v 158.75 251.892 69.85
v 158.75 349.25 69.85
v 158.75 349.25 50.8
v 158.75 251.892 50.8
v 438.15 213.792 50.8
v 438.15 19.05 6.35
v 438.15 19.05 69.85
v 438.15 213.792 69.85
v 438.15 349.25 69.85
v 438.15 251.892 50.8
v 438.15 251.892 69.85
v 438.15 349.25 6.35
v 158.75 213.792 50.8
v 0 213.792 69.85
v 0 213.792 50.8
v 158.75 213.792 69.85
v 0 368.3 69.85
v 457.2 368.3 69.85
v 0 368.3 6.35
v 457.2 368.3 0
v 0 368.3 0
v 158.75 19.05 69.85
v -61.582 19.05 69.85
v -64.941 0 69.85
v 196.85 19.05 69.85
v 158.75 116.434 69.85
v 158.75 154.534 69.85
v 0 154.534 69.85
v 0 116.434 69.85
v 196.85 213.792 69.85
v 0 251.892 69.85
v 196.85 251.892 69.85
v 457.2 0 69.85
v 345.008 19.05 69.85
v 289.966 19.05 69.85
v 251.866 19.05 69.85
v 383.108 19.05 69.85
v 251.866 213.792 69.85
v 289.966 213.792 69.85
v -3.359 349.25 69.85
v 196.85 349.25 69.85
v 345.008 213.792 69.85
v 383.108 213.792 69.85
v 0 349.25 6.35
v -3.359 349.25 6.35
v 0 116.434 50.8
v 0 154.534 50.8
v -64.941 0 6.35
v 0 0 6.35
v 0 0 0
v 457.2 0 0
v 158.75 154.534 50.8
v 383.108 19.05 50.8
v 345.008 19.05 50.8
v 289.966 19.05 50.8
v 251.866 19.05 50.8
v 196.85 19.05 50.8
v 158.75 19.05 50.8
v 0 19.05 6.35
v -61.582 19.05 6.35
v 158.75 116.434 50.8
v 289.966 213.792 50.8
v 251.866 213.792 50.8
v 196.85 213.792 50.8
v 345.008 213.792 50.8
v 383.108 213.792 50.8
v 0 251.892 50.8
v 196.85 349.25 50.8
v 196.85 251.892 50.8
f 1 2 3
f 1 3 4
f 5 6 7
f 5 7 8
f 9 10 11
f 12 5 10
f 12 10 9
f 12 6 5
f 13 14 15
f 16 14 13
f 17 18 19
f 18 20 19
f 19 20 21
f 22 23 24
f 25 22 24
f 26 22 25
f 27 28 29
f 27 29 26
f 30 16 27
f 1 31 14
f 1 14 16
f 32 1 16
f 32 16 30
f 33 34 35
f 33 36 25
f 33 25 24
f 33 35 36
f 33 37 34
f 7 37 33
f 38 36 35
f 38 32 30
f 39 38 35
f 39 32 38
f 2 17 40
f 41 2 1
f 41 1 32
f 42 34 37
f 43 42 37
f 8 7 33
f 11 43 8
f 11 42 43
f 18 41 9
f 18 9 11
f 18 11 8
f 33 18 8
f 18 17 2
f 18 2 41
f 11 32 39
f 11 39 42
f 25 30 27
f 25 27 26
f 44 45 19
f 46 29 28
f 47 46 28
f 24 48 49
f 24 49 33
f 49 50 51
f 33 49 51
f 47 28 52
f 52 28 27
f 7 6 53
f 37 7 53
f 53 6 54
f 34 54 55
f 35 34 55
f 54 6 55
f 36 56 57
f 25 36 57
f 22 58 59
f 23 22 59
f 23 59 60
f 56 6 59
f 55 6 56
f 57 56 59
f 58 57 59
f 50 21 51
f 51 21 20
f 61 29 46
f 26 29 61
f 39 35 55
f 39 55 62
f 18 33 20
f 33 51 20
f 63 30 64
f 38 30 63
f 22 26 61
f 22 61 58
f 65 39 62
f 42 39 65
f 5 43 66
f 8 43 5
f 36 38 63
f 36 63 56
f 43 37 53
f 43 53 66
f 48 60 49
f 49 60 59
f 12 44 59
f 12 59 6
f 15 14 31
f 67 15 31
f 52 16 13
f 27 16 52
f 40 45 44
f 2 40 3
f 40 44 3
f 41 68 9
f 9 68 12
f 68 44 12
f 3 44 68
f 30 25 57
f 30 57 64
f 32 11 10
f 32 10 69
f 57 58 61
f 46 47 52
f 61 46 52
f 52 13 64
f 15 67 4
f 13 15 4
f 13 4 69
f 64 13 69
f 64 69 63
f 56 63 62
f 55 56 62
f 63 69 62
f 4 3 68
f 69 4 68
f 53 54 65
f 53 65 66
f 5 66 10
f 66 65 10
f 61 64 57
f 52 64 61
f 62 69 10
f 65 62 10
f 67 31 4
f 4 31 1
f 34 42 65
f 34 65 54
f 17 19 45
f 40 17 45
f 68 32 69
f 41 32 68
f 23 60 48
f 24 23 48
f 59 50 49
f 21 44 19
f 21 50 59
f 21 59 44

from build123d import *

# Parameters (mm, degrees)
F0_W     = 457.2
F0_H     = 368.3
F1_DEPTH = 6.35
F2_W     = 19.05
F2_H     = 330.2
F3_DEPTH = 63.5
F4_W     = 158.75
F4_H     = 38.1
F4_W_2   = 55.0164
F4_W_3   = 55.0418
F5_DEPTH = 19.05


with BuildPart() as f1:
    # F0 (on Top) → F1 (new body)
    with BuildSketch(Plane.XY):
        with Locations((228.6, 184.15)):
            Rectangle(F0_W, F0_H)
    extrude(amount=F1_DEPTH)

    # F2 (on face) → F3 (join)
    with BuildSketch(Plane.XY.offset(6.35)):
        Polygon((-61.582198, 19.05), (-64.941227, 0), (0, 0), (0, 19.05), align=None)
        Polygon((0, 19.05), (0, 0), (457.2, 0), (457.2, 19.05), (438.15, 19.05), align=None)
        with Locations((447.675, 184.15)):
            Rectangle(F2_W, F2_H)
        Polygon((0, 368.3), (0, 349.25), (438.15, 349.25), (457.2, 349.25), (457.2, 368.3), align=None)
        Polygon((-3.359029, 349.25), (0, 349.25), (0, 368.3), align=None)
    extrude(amount=F3_DEPTH)

    # F4 (on face) → F5 (join)
    with BuildSketch(Plane.XY.offset(69.85)):
        with Locations((79.375, 232.8418)):
            Rectangle(F4_W, F4_H)
        Polygon((196.85, 213.7918), (196.85, 251.8918), (196.85, 349.25), (158.75, 349.25), (158.75, 251.8918), (158.75, 213.7918), (158.75, 154.5336), (158.75, 116.4336), (158.75, 19.05), (196.85, 19.05), align=None)
        with Locations((224.3582, 232.8418)):
            Rectangle(F4_W_2, F4_H)
        Polygon((289.9664, 19.05), (289.9664, 213.7918), (289.9664, 251.8918), (251.8664, 251.8918), (251.8664, 213.7918), (251.8664, 19.05), align=None)
        with Locations((317.4873, 232.8418)):
            Rectangle(F4_W_3, F4_H)
        Polygon((345.0082, 19.05), (383.1082, 19.05), (383.1082, 213.7918), (383.1082, 251.8918), (345.0082, 251.8918), (345.0082, 213.7918), align=None)
        with Locations((410.6291, 232.8418)):
            Rectangle(F4_W_3, F4_H)
        with Locations((79.375, 135.4836)):
            Rectangle(F4_W, F4_H)
    extrude(amount=-F5_DEPTH)


solid = f1.part
